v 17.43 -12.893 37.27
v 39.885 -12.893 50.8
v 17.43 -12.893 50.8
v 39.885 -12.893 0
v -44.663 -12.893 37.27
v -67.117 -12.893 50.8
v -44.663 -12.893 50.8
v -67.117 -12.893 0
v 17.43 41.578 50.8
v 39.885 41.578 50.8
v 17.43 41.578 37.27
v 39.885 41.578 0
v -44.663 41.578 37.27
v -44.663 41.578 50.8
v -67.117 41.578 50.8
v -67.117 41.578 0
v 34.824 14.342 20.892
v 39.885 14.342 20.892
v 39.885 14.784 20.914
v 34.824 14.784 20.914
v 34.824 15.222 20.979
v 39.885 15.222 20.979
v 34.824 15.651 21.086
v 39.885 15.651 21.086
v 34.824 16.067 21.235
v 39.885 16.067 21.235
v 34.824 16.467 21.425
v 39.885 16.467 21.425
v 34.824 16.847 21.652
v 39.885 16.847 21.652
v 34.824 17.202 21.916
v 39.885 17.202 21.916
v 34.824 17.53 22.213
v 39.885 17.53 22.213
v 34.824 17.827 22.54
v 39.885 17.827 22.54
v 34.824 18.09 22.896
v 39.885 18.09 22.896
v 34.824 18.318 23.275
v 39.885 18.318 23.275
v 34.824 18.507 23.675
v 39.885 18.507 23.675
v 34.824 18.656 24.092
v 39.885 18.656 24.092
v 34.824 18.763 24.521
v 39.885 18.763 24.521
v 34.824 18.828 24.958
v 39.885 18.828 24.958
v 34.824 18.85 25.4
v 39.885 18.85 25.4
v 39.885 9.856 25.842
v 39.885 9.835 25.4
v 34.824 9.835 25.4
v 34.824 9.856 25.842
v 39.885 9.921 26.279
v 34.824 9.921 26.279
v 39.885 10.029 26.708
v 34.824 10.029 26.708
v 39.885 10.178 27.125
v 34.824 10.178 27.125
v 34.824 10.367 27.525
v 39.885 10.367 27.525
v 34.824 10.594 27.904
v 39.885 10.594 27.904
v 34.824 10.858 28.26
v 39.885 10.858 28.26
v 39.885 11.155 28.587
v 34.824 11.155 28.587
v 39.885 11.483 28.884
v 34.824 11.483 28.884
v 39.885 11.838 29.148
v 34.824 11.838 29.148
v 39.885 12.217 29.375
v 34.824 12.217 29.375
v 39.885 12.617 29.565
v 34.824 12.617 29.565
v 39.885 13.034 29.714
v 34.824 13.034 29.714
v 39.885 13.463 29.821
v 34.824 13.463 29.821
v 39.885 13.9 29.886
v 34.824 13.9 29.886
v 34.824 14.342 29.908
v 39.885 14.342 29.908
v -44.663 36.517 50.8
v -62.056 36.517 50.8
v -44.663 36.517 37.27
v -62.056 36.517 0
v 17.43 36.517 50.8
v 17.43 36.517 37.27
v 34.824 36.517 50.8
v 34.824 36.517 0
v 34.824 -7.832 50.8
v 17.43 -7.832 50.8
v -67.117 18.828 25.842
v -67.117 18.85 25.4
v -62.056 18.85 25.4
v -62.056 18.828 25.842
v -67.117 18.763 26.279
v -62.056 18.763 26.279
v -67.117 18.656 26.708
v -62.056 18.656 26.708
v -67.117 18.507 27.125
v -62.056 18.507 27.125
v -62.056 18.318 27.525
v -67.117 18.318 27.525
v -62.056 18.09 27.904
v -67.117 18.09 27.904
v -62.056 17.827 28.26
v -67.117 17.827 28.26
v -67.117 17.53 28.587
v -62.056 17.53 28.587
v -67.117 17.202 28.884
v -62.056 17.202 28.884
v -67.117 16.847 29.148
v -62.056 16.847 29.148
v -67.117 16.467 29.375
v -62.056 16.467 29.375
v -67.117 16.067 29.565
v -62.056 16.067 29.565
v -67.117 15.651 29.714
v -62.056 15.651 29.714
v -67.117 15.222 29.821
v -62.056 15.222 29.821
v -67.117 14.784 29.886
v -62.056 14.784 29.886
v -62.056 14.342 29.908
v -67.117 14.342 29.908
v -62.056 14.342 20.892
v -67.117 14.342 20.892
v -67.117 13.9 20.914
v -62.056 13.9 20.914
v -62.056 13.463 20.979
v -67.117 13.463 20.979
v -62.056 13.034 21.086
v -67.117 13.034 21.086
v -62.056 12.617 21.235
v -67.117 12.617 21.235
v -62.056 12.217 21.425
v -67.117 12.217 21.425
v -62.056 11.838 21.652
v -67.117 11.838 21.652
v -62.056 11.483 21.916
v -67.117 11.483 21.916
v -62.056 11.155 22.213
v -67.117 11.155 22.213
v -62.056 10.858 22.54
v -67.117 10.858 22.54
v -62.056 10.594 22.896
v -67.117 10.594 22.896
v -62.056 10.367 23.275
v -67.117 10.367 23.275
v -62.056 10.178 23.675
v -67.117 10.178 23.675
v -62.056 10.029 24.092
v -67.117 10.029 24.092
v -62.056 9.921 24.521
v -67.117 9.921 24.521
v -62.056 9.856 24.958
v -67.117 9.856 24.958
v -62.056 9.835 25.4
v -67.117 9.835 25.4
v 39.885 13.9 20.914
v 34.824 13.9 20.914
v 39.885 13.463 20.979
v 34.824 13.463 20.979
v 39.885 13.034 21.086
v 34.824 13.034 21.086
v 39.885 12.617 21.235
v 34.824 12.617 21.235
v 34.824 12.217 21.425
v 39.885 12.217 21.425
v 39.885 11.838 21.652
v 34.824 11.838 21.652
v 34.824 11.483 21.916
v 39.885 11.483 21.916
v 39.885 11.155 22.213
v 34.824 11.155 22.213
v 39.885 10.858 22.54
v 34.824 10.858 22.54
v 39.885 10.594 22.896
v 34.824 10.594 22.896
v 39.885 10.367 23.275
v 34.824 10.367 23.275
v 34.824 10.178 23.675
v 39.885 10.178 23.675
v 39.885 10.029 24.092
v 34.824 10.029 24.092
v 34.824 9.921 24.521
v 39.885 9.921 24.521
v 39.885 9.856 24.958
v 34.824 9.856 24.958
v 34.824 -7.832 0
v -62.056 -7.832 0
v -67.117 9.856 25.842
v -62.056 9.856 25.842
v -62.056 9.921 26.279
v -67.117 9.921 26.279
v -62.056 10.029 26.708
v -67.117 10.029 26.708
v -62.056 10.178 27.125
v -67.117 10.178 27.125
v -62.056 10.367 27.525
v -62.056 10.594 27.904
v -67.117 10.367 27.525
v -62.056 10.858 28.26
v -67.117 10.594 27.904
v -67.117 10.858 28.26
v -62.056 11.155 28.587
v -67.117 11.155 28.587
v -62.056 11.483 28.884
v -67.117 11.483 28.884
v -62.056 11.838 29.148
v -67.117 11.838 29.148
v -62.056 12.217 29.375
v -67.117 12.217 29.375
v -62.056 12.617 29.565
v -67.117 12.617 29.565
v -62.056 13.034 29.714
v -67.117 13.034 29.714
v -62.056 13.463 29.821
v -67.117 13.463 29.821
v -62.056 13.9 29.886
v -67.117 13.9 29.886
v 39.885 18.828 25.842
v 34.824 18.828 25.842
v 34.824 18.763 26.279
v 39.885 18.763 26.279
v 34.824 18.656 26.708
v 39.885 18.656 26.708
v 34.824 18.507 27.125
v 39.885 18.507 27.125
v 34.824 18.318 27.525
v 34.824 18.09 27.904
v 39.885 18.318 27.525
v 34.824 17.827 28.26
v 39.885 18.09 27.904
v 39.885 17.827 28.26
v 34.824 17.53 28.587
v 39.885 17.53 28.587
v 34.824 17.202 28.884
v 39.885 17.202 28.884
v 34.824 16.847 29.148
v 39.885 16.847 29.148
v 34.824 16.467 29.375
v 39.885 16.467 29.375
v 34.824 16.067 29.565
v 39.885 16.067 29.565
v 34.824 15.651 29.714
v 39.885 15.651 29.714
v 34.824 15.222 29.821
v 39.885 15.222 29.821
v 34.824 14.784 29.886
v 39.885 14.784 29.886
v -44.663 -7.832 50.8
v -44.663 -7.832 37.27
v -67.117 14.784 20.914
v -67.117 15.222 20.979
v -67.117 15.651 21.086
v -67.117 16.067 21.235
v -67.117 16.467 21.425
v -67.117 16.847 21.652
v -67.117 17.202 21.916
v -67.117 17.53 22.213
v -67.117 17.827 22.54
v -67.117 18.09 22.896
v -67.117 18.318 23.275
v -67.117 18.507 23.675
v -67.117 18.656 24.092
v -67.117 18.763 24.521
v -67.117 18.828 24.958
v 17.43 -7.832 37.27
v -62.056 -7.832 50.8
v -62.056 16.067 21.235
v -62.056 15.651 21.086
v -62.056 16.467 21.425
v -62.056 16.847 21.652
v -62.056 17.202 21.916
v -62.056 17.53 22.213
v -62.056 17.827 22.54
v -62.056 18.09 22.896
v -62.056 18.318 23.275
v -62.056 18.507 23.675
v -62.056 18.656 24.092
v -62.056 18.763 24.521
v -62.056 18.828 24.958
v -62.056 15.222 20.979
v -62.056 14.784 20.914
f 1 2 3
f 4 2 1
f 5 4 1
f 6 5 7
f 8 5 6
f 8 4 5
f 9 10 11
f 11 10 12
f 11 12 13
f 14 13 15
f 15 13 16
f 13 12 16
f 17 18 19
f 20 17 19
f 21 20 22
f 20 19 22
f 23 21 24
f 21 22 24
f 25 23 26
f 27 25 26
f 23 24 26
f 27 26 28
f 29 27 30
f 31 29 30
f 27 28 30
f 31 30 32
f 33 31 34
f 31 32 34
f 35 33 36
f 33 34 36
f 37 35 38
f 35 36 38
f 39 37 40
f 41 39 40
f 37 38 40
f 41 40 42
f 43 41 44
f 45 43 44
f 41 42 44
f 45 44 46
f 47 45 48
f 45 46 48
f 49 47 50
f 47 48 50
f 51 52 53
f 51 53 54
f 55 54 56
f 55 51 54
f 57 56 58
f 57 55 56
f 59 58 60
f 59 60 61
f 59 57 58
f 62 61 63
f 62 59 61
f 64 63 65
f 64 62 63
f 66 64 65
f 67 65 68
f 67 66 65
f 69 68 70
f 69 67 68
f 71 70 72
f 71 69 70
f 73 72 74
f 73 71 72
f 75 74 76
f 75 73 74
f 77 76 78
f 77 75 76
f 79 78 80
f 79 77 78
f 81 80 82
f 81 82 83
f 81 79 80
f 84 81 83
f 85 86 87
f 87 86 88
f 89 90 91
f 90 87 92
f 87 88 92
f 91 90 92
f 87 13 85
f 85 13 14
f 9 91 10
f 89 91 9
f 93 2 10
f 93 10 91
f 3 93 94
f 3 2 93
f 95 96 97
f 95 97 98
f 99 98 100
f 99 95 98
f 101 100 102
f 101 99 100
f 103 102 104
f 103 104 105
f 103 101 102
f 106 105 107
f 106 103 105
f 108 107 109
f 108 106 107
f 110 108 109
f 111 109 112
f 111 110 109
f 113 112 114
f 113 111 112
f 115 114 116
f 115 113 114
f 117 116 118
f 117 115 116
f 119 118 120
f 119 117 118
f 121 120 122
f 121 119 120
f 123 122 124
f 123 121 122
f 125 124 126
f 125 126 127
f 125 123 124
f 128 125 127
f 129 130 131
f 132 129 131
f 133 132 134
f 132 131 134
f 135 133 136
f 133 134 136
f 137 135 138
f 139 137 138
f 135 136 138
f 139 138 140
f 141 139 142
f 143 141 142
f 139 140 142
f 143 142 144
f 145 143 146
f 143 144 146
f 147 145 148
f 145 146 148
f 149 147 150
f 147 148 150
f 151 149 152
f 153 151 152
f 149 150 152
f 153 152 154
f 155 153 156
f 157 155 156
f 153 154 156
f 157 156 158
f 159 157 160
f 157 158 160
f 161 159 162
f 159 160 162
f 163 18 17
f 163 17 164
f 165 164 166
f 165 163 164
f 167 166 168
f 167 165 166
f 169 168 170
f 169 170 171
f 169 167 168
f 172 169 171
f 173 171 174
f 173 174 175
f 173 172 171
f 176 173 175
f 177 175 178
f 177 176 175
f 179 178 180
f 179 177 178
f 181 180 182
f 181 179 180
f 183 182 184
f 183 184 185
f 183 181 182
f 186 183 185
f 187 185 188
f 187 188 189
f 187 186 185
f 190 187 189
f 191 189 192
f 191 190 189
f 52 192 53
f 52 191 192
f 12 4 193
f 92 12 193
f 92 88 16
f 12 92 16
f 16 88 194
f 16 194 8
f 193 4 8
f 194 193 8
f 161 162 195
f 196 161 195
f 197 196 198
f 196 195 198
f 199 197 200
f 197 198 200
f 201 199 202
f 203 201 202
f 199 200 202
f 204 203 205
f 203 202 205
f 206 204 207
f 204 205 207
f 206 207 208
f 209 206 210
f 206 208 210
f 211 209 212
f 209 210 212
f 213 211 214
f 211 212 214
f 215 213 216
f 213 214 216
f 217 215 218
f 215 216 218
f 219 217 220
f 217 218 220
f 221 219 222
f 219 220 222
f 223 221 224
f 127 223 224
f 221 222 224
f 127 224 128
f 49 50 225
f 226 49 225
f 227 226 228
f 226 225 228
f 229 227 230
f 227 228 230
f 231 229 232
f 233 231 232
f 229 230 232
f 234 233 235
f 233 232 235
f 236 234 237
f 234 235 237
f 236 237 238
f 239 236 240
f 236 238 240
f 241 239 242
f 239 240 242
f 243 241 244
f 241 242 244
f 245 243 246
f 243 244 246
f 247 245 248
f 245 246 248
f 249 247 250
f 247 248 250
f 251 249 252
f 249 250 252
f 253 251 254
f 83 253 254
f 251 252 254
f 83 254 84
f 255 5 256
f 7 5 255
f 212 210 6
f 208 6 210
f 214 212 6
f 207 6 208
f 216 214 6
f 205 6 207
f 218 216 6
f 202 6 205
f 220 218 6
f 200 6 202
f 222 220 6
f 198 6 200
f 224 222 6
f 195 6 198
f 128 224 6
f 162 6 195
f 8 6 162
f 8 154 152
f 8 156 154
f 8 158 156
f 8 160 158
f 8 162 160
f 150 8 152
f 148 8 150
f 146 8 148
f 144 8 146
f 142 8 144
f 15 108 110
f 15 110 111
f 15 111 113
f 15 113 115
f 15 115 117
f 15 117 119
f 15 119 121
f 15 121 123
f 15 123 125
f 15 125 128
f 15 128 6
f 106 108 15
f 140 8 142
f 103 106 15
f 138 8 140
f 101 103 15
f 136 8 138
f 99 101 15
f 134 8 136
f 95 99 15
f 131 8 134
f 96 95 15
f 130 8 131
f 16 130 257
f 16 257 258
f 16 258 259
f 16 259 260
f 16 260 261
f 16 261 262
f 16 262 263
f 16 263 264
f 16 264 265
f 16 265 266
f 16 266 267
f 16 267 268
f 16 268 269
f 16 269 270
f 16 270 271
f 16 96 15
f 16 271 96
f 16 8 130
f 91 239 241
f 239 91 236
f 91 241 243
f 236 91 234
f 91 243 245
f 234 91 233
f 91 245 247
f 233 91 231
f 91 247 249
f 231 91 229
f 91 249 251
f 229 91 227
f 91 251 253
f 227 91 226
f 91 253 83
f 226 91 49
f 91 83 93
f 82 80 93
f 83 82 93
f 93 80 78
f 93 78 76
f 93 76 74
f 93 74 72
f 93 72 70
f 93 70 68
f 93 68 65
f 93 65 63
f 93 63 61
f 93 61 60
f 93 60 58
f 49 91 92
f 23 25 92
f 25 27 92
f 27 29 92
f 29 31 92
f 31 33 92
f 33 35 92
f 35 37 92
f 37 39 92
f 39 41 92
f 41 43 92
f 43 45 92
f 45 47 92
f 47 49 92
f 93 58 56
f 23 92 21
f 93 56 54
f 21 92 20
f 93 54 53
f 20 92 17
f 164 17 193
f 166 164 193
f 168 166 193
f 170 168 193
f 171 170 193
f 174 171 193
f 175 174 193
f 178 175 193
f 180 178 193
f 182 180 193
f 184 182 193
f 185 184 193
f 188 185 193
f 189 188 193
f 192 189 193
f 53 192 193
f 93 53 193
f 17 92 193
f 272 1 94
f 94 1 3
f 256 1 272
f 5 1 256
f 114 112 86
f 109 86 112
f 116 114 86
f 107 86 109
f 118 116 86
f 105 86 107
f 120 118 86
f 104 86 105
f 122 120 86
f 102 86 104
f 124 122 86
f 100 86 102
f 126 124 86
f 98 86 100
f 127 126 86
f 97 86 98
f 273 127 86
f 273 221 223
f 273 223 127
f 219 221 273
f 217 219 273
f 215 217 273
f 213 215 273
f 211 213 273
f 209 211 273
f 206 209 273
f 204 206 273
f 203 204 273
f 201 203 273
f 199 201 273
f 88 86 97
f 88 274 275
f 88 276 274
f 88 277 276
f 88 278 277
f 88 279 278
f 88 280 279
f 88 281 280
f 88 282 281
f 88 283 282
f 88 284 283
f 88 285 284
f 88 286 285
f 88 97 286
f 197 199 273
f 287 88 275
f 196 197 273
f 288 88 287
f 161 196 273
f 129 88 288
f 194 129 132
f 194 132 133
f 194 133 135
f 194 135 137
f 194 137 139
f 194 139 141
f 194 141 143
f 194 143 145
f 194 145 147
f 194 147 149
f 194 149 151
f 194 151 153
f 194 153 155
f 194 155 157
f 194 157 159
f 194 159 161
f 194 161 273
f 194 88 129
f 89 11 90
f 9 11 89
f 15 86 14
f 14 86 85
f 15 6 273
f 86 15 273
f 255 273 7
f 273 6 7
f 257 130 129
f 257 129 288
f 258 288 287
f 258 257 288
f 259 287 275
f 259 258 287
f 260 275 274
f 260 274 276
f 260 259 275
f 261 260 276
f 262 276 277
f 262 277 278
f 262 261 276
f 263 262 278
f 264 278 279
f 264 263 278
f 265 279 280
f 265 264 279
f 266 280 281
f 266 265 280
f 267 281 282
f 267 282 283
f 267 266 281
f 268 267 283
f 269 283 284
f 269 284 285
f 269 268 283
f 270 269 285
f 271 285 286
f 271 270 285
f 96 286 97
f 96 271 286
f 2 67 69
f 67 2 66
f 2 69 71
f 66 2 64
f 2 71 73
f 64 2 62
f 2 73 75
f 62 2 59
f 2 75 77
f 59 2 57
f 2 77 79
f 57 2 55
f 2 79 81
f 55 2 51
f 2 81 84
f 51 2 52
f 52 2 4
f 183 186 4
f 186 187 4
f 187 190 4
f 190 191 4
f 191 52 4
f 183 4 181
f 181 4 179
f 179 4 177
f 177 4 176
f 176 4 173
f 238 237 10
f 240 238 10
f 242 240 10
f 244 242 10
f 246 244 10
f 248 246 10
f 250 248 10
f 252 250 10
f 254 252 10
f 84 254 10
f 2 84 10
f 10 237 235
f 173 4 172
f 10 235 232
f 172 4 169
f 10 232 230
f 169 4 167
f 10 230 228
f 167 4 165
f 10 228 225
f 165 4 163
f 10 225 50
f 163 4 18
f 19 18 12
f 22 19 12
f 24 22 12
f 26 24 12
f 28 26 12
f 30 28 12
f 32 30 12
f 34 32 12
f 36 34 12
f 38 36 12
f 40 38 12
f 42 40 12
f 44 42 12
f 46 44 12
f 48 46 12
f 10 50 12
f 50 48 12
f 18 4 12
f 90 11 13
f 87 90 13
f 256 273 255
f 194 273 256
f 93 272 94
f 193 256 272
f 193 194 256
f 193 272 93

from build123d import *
from build123d import SkipClean  # not in build123d's __all__

# Parameters (mm, degrees)
F1_DEPTH = 50.8
F2_W     = 31.0465274379
F2_H     = 13.5299048007
F3_DEPTH = 25.4
F5_DEPTH = 25.4


with BuildPart() as f1:
    # F0 (on Top) → F1 (new body)
    with BuildSketch(Plane.XY):
        Polygon((-62.0559491217, 14.3422799075), (-67.1168267727, 14.3422799075), (-67.1168267727, -12.8931785002), (-13.6161604896, -12.8931785002), (-13.6161604896, -7.8323045745), (-62.0559491217, -7.8323045745), align=None)
    extrude(amount=F1_DEPTH)

    # F2 (on face) → F3 (cut)
    with BuildSketch(Plane.XZ.offset(12.8931785002)):
        with Locations((-29.1394242086, 44.0350475997)):
            Rectangle(F2_W, F2_H)
    extrude(amount=-F3_DEPTH, mode=Mode.SUBTRACT)

    # F4 (on face) → F5 (cut)
    with BuildSketch(Plane(origin=(-67.1168267727, 0, 0), x_dir=(0, -1, 0), z_dir=(-1, 0, 0))):
        with BuildLine():
            ThreePointArc((-14.3422799075, 20.8923586581), (-11.1548961475, 22.21261624), (-9.8346385657, 25.4))
            ThreePointArc((-9.8346385657, 25.4), (-11.1548961475, 28.58738376), (-14.3422799075, 29.9076413419))
            Line((-14.3422799075, 29.9076413419), (-14.3422799075, 20.8923586581))
        make_face()
    extrude(amount=-F5_DEPTH, mode=Mode.SUBTRACT)

    # F6: F1 across face


with BuildPart() as f1_1:
    add(f1.part, clean=False)
    with SkipClean():  # cleaning this boolean's faces spoils the solid; the shape is the same uncleaned
        add(f1.part.mirror(Plane(origin=(-64.5863879472, 14.3422799075, 10.4461793291), x_dir=(-1, 0, 0), z_dir=(0, 1, 0))), clean=False)

    # F7: F1 across face


with BuildPart() as f1_2:
    add(f1_1.part, clean=False)
    add(f1_1.part.mirror(Plane(origin=(-13.6161604896, 39.0473013524, 18.6350475997), x_dir=(0, 1, 0), z_dir=(1, 0, 0))), clean=False)


solid = f1_2.part
